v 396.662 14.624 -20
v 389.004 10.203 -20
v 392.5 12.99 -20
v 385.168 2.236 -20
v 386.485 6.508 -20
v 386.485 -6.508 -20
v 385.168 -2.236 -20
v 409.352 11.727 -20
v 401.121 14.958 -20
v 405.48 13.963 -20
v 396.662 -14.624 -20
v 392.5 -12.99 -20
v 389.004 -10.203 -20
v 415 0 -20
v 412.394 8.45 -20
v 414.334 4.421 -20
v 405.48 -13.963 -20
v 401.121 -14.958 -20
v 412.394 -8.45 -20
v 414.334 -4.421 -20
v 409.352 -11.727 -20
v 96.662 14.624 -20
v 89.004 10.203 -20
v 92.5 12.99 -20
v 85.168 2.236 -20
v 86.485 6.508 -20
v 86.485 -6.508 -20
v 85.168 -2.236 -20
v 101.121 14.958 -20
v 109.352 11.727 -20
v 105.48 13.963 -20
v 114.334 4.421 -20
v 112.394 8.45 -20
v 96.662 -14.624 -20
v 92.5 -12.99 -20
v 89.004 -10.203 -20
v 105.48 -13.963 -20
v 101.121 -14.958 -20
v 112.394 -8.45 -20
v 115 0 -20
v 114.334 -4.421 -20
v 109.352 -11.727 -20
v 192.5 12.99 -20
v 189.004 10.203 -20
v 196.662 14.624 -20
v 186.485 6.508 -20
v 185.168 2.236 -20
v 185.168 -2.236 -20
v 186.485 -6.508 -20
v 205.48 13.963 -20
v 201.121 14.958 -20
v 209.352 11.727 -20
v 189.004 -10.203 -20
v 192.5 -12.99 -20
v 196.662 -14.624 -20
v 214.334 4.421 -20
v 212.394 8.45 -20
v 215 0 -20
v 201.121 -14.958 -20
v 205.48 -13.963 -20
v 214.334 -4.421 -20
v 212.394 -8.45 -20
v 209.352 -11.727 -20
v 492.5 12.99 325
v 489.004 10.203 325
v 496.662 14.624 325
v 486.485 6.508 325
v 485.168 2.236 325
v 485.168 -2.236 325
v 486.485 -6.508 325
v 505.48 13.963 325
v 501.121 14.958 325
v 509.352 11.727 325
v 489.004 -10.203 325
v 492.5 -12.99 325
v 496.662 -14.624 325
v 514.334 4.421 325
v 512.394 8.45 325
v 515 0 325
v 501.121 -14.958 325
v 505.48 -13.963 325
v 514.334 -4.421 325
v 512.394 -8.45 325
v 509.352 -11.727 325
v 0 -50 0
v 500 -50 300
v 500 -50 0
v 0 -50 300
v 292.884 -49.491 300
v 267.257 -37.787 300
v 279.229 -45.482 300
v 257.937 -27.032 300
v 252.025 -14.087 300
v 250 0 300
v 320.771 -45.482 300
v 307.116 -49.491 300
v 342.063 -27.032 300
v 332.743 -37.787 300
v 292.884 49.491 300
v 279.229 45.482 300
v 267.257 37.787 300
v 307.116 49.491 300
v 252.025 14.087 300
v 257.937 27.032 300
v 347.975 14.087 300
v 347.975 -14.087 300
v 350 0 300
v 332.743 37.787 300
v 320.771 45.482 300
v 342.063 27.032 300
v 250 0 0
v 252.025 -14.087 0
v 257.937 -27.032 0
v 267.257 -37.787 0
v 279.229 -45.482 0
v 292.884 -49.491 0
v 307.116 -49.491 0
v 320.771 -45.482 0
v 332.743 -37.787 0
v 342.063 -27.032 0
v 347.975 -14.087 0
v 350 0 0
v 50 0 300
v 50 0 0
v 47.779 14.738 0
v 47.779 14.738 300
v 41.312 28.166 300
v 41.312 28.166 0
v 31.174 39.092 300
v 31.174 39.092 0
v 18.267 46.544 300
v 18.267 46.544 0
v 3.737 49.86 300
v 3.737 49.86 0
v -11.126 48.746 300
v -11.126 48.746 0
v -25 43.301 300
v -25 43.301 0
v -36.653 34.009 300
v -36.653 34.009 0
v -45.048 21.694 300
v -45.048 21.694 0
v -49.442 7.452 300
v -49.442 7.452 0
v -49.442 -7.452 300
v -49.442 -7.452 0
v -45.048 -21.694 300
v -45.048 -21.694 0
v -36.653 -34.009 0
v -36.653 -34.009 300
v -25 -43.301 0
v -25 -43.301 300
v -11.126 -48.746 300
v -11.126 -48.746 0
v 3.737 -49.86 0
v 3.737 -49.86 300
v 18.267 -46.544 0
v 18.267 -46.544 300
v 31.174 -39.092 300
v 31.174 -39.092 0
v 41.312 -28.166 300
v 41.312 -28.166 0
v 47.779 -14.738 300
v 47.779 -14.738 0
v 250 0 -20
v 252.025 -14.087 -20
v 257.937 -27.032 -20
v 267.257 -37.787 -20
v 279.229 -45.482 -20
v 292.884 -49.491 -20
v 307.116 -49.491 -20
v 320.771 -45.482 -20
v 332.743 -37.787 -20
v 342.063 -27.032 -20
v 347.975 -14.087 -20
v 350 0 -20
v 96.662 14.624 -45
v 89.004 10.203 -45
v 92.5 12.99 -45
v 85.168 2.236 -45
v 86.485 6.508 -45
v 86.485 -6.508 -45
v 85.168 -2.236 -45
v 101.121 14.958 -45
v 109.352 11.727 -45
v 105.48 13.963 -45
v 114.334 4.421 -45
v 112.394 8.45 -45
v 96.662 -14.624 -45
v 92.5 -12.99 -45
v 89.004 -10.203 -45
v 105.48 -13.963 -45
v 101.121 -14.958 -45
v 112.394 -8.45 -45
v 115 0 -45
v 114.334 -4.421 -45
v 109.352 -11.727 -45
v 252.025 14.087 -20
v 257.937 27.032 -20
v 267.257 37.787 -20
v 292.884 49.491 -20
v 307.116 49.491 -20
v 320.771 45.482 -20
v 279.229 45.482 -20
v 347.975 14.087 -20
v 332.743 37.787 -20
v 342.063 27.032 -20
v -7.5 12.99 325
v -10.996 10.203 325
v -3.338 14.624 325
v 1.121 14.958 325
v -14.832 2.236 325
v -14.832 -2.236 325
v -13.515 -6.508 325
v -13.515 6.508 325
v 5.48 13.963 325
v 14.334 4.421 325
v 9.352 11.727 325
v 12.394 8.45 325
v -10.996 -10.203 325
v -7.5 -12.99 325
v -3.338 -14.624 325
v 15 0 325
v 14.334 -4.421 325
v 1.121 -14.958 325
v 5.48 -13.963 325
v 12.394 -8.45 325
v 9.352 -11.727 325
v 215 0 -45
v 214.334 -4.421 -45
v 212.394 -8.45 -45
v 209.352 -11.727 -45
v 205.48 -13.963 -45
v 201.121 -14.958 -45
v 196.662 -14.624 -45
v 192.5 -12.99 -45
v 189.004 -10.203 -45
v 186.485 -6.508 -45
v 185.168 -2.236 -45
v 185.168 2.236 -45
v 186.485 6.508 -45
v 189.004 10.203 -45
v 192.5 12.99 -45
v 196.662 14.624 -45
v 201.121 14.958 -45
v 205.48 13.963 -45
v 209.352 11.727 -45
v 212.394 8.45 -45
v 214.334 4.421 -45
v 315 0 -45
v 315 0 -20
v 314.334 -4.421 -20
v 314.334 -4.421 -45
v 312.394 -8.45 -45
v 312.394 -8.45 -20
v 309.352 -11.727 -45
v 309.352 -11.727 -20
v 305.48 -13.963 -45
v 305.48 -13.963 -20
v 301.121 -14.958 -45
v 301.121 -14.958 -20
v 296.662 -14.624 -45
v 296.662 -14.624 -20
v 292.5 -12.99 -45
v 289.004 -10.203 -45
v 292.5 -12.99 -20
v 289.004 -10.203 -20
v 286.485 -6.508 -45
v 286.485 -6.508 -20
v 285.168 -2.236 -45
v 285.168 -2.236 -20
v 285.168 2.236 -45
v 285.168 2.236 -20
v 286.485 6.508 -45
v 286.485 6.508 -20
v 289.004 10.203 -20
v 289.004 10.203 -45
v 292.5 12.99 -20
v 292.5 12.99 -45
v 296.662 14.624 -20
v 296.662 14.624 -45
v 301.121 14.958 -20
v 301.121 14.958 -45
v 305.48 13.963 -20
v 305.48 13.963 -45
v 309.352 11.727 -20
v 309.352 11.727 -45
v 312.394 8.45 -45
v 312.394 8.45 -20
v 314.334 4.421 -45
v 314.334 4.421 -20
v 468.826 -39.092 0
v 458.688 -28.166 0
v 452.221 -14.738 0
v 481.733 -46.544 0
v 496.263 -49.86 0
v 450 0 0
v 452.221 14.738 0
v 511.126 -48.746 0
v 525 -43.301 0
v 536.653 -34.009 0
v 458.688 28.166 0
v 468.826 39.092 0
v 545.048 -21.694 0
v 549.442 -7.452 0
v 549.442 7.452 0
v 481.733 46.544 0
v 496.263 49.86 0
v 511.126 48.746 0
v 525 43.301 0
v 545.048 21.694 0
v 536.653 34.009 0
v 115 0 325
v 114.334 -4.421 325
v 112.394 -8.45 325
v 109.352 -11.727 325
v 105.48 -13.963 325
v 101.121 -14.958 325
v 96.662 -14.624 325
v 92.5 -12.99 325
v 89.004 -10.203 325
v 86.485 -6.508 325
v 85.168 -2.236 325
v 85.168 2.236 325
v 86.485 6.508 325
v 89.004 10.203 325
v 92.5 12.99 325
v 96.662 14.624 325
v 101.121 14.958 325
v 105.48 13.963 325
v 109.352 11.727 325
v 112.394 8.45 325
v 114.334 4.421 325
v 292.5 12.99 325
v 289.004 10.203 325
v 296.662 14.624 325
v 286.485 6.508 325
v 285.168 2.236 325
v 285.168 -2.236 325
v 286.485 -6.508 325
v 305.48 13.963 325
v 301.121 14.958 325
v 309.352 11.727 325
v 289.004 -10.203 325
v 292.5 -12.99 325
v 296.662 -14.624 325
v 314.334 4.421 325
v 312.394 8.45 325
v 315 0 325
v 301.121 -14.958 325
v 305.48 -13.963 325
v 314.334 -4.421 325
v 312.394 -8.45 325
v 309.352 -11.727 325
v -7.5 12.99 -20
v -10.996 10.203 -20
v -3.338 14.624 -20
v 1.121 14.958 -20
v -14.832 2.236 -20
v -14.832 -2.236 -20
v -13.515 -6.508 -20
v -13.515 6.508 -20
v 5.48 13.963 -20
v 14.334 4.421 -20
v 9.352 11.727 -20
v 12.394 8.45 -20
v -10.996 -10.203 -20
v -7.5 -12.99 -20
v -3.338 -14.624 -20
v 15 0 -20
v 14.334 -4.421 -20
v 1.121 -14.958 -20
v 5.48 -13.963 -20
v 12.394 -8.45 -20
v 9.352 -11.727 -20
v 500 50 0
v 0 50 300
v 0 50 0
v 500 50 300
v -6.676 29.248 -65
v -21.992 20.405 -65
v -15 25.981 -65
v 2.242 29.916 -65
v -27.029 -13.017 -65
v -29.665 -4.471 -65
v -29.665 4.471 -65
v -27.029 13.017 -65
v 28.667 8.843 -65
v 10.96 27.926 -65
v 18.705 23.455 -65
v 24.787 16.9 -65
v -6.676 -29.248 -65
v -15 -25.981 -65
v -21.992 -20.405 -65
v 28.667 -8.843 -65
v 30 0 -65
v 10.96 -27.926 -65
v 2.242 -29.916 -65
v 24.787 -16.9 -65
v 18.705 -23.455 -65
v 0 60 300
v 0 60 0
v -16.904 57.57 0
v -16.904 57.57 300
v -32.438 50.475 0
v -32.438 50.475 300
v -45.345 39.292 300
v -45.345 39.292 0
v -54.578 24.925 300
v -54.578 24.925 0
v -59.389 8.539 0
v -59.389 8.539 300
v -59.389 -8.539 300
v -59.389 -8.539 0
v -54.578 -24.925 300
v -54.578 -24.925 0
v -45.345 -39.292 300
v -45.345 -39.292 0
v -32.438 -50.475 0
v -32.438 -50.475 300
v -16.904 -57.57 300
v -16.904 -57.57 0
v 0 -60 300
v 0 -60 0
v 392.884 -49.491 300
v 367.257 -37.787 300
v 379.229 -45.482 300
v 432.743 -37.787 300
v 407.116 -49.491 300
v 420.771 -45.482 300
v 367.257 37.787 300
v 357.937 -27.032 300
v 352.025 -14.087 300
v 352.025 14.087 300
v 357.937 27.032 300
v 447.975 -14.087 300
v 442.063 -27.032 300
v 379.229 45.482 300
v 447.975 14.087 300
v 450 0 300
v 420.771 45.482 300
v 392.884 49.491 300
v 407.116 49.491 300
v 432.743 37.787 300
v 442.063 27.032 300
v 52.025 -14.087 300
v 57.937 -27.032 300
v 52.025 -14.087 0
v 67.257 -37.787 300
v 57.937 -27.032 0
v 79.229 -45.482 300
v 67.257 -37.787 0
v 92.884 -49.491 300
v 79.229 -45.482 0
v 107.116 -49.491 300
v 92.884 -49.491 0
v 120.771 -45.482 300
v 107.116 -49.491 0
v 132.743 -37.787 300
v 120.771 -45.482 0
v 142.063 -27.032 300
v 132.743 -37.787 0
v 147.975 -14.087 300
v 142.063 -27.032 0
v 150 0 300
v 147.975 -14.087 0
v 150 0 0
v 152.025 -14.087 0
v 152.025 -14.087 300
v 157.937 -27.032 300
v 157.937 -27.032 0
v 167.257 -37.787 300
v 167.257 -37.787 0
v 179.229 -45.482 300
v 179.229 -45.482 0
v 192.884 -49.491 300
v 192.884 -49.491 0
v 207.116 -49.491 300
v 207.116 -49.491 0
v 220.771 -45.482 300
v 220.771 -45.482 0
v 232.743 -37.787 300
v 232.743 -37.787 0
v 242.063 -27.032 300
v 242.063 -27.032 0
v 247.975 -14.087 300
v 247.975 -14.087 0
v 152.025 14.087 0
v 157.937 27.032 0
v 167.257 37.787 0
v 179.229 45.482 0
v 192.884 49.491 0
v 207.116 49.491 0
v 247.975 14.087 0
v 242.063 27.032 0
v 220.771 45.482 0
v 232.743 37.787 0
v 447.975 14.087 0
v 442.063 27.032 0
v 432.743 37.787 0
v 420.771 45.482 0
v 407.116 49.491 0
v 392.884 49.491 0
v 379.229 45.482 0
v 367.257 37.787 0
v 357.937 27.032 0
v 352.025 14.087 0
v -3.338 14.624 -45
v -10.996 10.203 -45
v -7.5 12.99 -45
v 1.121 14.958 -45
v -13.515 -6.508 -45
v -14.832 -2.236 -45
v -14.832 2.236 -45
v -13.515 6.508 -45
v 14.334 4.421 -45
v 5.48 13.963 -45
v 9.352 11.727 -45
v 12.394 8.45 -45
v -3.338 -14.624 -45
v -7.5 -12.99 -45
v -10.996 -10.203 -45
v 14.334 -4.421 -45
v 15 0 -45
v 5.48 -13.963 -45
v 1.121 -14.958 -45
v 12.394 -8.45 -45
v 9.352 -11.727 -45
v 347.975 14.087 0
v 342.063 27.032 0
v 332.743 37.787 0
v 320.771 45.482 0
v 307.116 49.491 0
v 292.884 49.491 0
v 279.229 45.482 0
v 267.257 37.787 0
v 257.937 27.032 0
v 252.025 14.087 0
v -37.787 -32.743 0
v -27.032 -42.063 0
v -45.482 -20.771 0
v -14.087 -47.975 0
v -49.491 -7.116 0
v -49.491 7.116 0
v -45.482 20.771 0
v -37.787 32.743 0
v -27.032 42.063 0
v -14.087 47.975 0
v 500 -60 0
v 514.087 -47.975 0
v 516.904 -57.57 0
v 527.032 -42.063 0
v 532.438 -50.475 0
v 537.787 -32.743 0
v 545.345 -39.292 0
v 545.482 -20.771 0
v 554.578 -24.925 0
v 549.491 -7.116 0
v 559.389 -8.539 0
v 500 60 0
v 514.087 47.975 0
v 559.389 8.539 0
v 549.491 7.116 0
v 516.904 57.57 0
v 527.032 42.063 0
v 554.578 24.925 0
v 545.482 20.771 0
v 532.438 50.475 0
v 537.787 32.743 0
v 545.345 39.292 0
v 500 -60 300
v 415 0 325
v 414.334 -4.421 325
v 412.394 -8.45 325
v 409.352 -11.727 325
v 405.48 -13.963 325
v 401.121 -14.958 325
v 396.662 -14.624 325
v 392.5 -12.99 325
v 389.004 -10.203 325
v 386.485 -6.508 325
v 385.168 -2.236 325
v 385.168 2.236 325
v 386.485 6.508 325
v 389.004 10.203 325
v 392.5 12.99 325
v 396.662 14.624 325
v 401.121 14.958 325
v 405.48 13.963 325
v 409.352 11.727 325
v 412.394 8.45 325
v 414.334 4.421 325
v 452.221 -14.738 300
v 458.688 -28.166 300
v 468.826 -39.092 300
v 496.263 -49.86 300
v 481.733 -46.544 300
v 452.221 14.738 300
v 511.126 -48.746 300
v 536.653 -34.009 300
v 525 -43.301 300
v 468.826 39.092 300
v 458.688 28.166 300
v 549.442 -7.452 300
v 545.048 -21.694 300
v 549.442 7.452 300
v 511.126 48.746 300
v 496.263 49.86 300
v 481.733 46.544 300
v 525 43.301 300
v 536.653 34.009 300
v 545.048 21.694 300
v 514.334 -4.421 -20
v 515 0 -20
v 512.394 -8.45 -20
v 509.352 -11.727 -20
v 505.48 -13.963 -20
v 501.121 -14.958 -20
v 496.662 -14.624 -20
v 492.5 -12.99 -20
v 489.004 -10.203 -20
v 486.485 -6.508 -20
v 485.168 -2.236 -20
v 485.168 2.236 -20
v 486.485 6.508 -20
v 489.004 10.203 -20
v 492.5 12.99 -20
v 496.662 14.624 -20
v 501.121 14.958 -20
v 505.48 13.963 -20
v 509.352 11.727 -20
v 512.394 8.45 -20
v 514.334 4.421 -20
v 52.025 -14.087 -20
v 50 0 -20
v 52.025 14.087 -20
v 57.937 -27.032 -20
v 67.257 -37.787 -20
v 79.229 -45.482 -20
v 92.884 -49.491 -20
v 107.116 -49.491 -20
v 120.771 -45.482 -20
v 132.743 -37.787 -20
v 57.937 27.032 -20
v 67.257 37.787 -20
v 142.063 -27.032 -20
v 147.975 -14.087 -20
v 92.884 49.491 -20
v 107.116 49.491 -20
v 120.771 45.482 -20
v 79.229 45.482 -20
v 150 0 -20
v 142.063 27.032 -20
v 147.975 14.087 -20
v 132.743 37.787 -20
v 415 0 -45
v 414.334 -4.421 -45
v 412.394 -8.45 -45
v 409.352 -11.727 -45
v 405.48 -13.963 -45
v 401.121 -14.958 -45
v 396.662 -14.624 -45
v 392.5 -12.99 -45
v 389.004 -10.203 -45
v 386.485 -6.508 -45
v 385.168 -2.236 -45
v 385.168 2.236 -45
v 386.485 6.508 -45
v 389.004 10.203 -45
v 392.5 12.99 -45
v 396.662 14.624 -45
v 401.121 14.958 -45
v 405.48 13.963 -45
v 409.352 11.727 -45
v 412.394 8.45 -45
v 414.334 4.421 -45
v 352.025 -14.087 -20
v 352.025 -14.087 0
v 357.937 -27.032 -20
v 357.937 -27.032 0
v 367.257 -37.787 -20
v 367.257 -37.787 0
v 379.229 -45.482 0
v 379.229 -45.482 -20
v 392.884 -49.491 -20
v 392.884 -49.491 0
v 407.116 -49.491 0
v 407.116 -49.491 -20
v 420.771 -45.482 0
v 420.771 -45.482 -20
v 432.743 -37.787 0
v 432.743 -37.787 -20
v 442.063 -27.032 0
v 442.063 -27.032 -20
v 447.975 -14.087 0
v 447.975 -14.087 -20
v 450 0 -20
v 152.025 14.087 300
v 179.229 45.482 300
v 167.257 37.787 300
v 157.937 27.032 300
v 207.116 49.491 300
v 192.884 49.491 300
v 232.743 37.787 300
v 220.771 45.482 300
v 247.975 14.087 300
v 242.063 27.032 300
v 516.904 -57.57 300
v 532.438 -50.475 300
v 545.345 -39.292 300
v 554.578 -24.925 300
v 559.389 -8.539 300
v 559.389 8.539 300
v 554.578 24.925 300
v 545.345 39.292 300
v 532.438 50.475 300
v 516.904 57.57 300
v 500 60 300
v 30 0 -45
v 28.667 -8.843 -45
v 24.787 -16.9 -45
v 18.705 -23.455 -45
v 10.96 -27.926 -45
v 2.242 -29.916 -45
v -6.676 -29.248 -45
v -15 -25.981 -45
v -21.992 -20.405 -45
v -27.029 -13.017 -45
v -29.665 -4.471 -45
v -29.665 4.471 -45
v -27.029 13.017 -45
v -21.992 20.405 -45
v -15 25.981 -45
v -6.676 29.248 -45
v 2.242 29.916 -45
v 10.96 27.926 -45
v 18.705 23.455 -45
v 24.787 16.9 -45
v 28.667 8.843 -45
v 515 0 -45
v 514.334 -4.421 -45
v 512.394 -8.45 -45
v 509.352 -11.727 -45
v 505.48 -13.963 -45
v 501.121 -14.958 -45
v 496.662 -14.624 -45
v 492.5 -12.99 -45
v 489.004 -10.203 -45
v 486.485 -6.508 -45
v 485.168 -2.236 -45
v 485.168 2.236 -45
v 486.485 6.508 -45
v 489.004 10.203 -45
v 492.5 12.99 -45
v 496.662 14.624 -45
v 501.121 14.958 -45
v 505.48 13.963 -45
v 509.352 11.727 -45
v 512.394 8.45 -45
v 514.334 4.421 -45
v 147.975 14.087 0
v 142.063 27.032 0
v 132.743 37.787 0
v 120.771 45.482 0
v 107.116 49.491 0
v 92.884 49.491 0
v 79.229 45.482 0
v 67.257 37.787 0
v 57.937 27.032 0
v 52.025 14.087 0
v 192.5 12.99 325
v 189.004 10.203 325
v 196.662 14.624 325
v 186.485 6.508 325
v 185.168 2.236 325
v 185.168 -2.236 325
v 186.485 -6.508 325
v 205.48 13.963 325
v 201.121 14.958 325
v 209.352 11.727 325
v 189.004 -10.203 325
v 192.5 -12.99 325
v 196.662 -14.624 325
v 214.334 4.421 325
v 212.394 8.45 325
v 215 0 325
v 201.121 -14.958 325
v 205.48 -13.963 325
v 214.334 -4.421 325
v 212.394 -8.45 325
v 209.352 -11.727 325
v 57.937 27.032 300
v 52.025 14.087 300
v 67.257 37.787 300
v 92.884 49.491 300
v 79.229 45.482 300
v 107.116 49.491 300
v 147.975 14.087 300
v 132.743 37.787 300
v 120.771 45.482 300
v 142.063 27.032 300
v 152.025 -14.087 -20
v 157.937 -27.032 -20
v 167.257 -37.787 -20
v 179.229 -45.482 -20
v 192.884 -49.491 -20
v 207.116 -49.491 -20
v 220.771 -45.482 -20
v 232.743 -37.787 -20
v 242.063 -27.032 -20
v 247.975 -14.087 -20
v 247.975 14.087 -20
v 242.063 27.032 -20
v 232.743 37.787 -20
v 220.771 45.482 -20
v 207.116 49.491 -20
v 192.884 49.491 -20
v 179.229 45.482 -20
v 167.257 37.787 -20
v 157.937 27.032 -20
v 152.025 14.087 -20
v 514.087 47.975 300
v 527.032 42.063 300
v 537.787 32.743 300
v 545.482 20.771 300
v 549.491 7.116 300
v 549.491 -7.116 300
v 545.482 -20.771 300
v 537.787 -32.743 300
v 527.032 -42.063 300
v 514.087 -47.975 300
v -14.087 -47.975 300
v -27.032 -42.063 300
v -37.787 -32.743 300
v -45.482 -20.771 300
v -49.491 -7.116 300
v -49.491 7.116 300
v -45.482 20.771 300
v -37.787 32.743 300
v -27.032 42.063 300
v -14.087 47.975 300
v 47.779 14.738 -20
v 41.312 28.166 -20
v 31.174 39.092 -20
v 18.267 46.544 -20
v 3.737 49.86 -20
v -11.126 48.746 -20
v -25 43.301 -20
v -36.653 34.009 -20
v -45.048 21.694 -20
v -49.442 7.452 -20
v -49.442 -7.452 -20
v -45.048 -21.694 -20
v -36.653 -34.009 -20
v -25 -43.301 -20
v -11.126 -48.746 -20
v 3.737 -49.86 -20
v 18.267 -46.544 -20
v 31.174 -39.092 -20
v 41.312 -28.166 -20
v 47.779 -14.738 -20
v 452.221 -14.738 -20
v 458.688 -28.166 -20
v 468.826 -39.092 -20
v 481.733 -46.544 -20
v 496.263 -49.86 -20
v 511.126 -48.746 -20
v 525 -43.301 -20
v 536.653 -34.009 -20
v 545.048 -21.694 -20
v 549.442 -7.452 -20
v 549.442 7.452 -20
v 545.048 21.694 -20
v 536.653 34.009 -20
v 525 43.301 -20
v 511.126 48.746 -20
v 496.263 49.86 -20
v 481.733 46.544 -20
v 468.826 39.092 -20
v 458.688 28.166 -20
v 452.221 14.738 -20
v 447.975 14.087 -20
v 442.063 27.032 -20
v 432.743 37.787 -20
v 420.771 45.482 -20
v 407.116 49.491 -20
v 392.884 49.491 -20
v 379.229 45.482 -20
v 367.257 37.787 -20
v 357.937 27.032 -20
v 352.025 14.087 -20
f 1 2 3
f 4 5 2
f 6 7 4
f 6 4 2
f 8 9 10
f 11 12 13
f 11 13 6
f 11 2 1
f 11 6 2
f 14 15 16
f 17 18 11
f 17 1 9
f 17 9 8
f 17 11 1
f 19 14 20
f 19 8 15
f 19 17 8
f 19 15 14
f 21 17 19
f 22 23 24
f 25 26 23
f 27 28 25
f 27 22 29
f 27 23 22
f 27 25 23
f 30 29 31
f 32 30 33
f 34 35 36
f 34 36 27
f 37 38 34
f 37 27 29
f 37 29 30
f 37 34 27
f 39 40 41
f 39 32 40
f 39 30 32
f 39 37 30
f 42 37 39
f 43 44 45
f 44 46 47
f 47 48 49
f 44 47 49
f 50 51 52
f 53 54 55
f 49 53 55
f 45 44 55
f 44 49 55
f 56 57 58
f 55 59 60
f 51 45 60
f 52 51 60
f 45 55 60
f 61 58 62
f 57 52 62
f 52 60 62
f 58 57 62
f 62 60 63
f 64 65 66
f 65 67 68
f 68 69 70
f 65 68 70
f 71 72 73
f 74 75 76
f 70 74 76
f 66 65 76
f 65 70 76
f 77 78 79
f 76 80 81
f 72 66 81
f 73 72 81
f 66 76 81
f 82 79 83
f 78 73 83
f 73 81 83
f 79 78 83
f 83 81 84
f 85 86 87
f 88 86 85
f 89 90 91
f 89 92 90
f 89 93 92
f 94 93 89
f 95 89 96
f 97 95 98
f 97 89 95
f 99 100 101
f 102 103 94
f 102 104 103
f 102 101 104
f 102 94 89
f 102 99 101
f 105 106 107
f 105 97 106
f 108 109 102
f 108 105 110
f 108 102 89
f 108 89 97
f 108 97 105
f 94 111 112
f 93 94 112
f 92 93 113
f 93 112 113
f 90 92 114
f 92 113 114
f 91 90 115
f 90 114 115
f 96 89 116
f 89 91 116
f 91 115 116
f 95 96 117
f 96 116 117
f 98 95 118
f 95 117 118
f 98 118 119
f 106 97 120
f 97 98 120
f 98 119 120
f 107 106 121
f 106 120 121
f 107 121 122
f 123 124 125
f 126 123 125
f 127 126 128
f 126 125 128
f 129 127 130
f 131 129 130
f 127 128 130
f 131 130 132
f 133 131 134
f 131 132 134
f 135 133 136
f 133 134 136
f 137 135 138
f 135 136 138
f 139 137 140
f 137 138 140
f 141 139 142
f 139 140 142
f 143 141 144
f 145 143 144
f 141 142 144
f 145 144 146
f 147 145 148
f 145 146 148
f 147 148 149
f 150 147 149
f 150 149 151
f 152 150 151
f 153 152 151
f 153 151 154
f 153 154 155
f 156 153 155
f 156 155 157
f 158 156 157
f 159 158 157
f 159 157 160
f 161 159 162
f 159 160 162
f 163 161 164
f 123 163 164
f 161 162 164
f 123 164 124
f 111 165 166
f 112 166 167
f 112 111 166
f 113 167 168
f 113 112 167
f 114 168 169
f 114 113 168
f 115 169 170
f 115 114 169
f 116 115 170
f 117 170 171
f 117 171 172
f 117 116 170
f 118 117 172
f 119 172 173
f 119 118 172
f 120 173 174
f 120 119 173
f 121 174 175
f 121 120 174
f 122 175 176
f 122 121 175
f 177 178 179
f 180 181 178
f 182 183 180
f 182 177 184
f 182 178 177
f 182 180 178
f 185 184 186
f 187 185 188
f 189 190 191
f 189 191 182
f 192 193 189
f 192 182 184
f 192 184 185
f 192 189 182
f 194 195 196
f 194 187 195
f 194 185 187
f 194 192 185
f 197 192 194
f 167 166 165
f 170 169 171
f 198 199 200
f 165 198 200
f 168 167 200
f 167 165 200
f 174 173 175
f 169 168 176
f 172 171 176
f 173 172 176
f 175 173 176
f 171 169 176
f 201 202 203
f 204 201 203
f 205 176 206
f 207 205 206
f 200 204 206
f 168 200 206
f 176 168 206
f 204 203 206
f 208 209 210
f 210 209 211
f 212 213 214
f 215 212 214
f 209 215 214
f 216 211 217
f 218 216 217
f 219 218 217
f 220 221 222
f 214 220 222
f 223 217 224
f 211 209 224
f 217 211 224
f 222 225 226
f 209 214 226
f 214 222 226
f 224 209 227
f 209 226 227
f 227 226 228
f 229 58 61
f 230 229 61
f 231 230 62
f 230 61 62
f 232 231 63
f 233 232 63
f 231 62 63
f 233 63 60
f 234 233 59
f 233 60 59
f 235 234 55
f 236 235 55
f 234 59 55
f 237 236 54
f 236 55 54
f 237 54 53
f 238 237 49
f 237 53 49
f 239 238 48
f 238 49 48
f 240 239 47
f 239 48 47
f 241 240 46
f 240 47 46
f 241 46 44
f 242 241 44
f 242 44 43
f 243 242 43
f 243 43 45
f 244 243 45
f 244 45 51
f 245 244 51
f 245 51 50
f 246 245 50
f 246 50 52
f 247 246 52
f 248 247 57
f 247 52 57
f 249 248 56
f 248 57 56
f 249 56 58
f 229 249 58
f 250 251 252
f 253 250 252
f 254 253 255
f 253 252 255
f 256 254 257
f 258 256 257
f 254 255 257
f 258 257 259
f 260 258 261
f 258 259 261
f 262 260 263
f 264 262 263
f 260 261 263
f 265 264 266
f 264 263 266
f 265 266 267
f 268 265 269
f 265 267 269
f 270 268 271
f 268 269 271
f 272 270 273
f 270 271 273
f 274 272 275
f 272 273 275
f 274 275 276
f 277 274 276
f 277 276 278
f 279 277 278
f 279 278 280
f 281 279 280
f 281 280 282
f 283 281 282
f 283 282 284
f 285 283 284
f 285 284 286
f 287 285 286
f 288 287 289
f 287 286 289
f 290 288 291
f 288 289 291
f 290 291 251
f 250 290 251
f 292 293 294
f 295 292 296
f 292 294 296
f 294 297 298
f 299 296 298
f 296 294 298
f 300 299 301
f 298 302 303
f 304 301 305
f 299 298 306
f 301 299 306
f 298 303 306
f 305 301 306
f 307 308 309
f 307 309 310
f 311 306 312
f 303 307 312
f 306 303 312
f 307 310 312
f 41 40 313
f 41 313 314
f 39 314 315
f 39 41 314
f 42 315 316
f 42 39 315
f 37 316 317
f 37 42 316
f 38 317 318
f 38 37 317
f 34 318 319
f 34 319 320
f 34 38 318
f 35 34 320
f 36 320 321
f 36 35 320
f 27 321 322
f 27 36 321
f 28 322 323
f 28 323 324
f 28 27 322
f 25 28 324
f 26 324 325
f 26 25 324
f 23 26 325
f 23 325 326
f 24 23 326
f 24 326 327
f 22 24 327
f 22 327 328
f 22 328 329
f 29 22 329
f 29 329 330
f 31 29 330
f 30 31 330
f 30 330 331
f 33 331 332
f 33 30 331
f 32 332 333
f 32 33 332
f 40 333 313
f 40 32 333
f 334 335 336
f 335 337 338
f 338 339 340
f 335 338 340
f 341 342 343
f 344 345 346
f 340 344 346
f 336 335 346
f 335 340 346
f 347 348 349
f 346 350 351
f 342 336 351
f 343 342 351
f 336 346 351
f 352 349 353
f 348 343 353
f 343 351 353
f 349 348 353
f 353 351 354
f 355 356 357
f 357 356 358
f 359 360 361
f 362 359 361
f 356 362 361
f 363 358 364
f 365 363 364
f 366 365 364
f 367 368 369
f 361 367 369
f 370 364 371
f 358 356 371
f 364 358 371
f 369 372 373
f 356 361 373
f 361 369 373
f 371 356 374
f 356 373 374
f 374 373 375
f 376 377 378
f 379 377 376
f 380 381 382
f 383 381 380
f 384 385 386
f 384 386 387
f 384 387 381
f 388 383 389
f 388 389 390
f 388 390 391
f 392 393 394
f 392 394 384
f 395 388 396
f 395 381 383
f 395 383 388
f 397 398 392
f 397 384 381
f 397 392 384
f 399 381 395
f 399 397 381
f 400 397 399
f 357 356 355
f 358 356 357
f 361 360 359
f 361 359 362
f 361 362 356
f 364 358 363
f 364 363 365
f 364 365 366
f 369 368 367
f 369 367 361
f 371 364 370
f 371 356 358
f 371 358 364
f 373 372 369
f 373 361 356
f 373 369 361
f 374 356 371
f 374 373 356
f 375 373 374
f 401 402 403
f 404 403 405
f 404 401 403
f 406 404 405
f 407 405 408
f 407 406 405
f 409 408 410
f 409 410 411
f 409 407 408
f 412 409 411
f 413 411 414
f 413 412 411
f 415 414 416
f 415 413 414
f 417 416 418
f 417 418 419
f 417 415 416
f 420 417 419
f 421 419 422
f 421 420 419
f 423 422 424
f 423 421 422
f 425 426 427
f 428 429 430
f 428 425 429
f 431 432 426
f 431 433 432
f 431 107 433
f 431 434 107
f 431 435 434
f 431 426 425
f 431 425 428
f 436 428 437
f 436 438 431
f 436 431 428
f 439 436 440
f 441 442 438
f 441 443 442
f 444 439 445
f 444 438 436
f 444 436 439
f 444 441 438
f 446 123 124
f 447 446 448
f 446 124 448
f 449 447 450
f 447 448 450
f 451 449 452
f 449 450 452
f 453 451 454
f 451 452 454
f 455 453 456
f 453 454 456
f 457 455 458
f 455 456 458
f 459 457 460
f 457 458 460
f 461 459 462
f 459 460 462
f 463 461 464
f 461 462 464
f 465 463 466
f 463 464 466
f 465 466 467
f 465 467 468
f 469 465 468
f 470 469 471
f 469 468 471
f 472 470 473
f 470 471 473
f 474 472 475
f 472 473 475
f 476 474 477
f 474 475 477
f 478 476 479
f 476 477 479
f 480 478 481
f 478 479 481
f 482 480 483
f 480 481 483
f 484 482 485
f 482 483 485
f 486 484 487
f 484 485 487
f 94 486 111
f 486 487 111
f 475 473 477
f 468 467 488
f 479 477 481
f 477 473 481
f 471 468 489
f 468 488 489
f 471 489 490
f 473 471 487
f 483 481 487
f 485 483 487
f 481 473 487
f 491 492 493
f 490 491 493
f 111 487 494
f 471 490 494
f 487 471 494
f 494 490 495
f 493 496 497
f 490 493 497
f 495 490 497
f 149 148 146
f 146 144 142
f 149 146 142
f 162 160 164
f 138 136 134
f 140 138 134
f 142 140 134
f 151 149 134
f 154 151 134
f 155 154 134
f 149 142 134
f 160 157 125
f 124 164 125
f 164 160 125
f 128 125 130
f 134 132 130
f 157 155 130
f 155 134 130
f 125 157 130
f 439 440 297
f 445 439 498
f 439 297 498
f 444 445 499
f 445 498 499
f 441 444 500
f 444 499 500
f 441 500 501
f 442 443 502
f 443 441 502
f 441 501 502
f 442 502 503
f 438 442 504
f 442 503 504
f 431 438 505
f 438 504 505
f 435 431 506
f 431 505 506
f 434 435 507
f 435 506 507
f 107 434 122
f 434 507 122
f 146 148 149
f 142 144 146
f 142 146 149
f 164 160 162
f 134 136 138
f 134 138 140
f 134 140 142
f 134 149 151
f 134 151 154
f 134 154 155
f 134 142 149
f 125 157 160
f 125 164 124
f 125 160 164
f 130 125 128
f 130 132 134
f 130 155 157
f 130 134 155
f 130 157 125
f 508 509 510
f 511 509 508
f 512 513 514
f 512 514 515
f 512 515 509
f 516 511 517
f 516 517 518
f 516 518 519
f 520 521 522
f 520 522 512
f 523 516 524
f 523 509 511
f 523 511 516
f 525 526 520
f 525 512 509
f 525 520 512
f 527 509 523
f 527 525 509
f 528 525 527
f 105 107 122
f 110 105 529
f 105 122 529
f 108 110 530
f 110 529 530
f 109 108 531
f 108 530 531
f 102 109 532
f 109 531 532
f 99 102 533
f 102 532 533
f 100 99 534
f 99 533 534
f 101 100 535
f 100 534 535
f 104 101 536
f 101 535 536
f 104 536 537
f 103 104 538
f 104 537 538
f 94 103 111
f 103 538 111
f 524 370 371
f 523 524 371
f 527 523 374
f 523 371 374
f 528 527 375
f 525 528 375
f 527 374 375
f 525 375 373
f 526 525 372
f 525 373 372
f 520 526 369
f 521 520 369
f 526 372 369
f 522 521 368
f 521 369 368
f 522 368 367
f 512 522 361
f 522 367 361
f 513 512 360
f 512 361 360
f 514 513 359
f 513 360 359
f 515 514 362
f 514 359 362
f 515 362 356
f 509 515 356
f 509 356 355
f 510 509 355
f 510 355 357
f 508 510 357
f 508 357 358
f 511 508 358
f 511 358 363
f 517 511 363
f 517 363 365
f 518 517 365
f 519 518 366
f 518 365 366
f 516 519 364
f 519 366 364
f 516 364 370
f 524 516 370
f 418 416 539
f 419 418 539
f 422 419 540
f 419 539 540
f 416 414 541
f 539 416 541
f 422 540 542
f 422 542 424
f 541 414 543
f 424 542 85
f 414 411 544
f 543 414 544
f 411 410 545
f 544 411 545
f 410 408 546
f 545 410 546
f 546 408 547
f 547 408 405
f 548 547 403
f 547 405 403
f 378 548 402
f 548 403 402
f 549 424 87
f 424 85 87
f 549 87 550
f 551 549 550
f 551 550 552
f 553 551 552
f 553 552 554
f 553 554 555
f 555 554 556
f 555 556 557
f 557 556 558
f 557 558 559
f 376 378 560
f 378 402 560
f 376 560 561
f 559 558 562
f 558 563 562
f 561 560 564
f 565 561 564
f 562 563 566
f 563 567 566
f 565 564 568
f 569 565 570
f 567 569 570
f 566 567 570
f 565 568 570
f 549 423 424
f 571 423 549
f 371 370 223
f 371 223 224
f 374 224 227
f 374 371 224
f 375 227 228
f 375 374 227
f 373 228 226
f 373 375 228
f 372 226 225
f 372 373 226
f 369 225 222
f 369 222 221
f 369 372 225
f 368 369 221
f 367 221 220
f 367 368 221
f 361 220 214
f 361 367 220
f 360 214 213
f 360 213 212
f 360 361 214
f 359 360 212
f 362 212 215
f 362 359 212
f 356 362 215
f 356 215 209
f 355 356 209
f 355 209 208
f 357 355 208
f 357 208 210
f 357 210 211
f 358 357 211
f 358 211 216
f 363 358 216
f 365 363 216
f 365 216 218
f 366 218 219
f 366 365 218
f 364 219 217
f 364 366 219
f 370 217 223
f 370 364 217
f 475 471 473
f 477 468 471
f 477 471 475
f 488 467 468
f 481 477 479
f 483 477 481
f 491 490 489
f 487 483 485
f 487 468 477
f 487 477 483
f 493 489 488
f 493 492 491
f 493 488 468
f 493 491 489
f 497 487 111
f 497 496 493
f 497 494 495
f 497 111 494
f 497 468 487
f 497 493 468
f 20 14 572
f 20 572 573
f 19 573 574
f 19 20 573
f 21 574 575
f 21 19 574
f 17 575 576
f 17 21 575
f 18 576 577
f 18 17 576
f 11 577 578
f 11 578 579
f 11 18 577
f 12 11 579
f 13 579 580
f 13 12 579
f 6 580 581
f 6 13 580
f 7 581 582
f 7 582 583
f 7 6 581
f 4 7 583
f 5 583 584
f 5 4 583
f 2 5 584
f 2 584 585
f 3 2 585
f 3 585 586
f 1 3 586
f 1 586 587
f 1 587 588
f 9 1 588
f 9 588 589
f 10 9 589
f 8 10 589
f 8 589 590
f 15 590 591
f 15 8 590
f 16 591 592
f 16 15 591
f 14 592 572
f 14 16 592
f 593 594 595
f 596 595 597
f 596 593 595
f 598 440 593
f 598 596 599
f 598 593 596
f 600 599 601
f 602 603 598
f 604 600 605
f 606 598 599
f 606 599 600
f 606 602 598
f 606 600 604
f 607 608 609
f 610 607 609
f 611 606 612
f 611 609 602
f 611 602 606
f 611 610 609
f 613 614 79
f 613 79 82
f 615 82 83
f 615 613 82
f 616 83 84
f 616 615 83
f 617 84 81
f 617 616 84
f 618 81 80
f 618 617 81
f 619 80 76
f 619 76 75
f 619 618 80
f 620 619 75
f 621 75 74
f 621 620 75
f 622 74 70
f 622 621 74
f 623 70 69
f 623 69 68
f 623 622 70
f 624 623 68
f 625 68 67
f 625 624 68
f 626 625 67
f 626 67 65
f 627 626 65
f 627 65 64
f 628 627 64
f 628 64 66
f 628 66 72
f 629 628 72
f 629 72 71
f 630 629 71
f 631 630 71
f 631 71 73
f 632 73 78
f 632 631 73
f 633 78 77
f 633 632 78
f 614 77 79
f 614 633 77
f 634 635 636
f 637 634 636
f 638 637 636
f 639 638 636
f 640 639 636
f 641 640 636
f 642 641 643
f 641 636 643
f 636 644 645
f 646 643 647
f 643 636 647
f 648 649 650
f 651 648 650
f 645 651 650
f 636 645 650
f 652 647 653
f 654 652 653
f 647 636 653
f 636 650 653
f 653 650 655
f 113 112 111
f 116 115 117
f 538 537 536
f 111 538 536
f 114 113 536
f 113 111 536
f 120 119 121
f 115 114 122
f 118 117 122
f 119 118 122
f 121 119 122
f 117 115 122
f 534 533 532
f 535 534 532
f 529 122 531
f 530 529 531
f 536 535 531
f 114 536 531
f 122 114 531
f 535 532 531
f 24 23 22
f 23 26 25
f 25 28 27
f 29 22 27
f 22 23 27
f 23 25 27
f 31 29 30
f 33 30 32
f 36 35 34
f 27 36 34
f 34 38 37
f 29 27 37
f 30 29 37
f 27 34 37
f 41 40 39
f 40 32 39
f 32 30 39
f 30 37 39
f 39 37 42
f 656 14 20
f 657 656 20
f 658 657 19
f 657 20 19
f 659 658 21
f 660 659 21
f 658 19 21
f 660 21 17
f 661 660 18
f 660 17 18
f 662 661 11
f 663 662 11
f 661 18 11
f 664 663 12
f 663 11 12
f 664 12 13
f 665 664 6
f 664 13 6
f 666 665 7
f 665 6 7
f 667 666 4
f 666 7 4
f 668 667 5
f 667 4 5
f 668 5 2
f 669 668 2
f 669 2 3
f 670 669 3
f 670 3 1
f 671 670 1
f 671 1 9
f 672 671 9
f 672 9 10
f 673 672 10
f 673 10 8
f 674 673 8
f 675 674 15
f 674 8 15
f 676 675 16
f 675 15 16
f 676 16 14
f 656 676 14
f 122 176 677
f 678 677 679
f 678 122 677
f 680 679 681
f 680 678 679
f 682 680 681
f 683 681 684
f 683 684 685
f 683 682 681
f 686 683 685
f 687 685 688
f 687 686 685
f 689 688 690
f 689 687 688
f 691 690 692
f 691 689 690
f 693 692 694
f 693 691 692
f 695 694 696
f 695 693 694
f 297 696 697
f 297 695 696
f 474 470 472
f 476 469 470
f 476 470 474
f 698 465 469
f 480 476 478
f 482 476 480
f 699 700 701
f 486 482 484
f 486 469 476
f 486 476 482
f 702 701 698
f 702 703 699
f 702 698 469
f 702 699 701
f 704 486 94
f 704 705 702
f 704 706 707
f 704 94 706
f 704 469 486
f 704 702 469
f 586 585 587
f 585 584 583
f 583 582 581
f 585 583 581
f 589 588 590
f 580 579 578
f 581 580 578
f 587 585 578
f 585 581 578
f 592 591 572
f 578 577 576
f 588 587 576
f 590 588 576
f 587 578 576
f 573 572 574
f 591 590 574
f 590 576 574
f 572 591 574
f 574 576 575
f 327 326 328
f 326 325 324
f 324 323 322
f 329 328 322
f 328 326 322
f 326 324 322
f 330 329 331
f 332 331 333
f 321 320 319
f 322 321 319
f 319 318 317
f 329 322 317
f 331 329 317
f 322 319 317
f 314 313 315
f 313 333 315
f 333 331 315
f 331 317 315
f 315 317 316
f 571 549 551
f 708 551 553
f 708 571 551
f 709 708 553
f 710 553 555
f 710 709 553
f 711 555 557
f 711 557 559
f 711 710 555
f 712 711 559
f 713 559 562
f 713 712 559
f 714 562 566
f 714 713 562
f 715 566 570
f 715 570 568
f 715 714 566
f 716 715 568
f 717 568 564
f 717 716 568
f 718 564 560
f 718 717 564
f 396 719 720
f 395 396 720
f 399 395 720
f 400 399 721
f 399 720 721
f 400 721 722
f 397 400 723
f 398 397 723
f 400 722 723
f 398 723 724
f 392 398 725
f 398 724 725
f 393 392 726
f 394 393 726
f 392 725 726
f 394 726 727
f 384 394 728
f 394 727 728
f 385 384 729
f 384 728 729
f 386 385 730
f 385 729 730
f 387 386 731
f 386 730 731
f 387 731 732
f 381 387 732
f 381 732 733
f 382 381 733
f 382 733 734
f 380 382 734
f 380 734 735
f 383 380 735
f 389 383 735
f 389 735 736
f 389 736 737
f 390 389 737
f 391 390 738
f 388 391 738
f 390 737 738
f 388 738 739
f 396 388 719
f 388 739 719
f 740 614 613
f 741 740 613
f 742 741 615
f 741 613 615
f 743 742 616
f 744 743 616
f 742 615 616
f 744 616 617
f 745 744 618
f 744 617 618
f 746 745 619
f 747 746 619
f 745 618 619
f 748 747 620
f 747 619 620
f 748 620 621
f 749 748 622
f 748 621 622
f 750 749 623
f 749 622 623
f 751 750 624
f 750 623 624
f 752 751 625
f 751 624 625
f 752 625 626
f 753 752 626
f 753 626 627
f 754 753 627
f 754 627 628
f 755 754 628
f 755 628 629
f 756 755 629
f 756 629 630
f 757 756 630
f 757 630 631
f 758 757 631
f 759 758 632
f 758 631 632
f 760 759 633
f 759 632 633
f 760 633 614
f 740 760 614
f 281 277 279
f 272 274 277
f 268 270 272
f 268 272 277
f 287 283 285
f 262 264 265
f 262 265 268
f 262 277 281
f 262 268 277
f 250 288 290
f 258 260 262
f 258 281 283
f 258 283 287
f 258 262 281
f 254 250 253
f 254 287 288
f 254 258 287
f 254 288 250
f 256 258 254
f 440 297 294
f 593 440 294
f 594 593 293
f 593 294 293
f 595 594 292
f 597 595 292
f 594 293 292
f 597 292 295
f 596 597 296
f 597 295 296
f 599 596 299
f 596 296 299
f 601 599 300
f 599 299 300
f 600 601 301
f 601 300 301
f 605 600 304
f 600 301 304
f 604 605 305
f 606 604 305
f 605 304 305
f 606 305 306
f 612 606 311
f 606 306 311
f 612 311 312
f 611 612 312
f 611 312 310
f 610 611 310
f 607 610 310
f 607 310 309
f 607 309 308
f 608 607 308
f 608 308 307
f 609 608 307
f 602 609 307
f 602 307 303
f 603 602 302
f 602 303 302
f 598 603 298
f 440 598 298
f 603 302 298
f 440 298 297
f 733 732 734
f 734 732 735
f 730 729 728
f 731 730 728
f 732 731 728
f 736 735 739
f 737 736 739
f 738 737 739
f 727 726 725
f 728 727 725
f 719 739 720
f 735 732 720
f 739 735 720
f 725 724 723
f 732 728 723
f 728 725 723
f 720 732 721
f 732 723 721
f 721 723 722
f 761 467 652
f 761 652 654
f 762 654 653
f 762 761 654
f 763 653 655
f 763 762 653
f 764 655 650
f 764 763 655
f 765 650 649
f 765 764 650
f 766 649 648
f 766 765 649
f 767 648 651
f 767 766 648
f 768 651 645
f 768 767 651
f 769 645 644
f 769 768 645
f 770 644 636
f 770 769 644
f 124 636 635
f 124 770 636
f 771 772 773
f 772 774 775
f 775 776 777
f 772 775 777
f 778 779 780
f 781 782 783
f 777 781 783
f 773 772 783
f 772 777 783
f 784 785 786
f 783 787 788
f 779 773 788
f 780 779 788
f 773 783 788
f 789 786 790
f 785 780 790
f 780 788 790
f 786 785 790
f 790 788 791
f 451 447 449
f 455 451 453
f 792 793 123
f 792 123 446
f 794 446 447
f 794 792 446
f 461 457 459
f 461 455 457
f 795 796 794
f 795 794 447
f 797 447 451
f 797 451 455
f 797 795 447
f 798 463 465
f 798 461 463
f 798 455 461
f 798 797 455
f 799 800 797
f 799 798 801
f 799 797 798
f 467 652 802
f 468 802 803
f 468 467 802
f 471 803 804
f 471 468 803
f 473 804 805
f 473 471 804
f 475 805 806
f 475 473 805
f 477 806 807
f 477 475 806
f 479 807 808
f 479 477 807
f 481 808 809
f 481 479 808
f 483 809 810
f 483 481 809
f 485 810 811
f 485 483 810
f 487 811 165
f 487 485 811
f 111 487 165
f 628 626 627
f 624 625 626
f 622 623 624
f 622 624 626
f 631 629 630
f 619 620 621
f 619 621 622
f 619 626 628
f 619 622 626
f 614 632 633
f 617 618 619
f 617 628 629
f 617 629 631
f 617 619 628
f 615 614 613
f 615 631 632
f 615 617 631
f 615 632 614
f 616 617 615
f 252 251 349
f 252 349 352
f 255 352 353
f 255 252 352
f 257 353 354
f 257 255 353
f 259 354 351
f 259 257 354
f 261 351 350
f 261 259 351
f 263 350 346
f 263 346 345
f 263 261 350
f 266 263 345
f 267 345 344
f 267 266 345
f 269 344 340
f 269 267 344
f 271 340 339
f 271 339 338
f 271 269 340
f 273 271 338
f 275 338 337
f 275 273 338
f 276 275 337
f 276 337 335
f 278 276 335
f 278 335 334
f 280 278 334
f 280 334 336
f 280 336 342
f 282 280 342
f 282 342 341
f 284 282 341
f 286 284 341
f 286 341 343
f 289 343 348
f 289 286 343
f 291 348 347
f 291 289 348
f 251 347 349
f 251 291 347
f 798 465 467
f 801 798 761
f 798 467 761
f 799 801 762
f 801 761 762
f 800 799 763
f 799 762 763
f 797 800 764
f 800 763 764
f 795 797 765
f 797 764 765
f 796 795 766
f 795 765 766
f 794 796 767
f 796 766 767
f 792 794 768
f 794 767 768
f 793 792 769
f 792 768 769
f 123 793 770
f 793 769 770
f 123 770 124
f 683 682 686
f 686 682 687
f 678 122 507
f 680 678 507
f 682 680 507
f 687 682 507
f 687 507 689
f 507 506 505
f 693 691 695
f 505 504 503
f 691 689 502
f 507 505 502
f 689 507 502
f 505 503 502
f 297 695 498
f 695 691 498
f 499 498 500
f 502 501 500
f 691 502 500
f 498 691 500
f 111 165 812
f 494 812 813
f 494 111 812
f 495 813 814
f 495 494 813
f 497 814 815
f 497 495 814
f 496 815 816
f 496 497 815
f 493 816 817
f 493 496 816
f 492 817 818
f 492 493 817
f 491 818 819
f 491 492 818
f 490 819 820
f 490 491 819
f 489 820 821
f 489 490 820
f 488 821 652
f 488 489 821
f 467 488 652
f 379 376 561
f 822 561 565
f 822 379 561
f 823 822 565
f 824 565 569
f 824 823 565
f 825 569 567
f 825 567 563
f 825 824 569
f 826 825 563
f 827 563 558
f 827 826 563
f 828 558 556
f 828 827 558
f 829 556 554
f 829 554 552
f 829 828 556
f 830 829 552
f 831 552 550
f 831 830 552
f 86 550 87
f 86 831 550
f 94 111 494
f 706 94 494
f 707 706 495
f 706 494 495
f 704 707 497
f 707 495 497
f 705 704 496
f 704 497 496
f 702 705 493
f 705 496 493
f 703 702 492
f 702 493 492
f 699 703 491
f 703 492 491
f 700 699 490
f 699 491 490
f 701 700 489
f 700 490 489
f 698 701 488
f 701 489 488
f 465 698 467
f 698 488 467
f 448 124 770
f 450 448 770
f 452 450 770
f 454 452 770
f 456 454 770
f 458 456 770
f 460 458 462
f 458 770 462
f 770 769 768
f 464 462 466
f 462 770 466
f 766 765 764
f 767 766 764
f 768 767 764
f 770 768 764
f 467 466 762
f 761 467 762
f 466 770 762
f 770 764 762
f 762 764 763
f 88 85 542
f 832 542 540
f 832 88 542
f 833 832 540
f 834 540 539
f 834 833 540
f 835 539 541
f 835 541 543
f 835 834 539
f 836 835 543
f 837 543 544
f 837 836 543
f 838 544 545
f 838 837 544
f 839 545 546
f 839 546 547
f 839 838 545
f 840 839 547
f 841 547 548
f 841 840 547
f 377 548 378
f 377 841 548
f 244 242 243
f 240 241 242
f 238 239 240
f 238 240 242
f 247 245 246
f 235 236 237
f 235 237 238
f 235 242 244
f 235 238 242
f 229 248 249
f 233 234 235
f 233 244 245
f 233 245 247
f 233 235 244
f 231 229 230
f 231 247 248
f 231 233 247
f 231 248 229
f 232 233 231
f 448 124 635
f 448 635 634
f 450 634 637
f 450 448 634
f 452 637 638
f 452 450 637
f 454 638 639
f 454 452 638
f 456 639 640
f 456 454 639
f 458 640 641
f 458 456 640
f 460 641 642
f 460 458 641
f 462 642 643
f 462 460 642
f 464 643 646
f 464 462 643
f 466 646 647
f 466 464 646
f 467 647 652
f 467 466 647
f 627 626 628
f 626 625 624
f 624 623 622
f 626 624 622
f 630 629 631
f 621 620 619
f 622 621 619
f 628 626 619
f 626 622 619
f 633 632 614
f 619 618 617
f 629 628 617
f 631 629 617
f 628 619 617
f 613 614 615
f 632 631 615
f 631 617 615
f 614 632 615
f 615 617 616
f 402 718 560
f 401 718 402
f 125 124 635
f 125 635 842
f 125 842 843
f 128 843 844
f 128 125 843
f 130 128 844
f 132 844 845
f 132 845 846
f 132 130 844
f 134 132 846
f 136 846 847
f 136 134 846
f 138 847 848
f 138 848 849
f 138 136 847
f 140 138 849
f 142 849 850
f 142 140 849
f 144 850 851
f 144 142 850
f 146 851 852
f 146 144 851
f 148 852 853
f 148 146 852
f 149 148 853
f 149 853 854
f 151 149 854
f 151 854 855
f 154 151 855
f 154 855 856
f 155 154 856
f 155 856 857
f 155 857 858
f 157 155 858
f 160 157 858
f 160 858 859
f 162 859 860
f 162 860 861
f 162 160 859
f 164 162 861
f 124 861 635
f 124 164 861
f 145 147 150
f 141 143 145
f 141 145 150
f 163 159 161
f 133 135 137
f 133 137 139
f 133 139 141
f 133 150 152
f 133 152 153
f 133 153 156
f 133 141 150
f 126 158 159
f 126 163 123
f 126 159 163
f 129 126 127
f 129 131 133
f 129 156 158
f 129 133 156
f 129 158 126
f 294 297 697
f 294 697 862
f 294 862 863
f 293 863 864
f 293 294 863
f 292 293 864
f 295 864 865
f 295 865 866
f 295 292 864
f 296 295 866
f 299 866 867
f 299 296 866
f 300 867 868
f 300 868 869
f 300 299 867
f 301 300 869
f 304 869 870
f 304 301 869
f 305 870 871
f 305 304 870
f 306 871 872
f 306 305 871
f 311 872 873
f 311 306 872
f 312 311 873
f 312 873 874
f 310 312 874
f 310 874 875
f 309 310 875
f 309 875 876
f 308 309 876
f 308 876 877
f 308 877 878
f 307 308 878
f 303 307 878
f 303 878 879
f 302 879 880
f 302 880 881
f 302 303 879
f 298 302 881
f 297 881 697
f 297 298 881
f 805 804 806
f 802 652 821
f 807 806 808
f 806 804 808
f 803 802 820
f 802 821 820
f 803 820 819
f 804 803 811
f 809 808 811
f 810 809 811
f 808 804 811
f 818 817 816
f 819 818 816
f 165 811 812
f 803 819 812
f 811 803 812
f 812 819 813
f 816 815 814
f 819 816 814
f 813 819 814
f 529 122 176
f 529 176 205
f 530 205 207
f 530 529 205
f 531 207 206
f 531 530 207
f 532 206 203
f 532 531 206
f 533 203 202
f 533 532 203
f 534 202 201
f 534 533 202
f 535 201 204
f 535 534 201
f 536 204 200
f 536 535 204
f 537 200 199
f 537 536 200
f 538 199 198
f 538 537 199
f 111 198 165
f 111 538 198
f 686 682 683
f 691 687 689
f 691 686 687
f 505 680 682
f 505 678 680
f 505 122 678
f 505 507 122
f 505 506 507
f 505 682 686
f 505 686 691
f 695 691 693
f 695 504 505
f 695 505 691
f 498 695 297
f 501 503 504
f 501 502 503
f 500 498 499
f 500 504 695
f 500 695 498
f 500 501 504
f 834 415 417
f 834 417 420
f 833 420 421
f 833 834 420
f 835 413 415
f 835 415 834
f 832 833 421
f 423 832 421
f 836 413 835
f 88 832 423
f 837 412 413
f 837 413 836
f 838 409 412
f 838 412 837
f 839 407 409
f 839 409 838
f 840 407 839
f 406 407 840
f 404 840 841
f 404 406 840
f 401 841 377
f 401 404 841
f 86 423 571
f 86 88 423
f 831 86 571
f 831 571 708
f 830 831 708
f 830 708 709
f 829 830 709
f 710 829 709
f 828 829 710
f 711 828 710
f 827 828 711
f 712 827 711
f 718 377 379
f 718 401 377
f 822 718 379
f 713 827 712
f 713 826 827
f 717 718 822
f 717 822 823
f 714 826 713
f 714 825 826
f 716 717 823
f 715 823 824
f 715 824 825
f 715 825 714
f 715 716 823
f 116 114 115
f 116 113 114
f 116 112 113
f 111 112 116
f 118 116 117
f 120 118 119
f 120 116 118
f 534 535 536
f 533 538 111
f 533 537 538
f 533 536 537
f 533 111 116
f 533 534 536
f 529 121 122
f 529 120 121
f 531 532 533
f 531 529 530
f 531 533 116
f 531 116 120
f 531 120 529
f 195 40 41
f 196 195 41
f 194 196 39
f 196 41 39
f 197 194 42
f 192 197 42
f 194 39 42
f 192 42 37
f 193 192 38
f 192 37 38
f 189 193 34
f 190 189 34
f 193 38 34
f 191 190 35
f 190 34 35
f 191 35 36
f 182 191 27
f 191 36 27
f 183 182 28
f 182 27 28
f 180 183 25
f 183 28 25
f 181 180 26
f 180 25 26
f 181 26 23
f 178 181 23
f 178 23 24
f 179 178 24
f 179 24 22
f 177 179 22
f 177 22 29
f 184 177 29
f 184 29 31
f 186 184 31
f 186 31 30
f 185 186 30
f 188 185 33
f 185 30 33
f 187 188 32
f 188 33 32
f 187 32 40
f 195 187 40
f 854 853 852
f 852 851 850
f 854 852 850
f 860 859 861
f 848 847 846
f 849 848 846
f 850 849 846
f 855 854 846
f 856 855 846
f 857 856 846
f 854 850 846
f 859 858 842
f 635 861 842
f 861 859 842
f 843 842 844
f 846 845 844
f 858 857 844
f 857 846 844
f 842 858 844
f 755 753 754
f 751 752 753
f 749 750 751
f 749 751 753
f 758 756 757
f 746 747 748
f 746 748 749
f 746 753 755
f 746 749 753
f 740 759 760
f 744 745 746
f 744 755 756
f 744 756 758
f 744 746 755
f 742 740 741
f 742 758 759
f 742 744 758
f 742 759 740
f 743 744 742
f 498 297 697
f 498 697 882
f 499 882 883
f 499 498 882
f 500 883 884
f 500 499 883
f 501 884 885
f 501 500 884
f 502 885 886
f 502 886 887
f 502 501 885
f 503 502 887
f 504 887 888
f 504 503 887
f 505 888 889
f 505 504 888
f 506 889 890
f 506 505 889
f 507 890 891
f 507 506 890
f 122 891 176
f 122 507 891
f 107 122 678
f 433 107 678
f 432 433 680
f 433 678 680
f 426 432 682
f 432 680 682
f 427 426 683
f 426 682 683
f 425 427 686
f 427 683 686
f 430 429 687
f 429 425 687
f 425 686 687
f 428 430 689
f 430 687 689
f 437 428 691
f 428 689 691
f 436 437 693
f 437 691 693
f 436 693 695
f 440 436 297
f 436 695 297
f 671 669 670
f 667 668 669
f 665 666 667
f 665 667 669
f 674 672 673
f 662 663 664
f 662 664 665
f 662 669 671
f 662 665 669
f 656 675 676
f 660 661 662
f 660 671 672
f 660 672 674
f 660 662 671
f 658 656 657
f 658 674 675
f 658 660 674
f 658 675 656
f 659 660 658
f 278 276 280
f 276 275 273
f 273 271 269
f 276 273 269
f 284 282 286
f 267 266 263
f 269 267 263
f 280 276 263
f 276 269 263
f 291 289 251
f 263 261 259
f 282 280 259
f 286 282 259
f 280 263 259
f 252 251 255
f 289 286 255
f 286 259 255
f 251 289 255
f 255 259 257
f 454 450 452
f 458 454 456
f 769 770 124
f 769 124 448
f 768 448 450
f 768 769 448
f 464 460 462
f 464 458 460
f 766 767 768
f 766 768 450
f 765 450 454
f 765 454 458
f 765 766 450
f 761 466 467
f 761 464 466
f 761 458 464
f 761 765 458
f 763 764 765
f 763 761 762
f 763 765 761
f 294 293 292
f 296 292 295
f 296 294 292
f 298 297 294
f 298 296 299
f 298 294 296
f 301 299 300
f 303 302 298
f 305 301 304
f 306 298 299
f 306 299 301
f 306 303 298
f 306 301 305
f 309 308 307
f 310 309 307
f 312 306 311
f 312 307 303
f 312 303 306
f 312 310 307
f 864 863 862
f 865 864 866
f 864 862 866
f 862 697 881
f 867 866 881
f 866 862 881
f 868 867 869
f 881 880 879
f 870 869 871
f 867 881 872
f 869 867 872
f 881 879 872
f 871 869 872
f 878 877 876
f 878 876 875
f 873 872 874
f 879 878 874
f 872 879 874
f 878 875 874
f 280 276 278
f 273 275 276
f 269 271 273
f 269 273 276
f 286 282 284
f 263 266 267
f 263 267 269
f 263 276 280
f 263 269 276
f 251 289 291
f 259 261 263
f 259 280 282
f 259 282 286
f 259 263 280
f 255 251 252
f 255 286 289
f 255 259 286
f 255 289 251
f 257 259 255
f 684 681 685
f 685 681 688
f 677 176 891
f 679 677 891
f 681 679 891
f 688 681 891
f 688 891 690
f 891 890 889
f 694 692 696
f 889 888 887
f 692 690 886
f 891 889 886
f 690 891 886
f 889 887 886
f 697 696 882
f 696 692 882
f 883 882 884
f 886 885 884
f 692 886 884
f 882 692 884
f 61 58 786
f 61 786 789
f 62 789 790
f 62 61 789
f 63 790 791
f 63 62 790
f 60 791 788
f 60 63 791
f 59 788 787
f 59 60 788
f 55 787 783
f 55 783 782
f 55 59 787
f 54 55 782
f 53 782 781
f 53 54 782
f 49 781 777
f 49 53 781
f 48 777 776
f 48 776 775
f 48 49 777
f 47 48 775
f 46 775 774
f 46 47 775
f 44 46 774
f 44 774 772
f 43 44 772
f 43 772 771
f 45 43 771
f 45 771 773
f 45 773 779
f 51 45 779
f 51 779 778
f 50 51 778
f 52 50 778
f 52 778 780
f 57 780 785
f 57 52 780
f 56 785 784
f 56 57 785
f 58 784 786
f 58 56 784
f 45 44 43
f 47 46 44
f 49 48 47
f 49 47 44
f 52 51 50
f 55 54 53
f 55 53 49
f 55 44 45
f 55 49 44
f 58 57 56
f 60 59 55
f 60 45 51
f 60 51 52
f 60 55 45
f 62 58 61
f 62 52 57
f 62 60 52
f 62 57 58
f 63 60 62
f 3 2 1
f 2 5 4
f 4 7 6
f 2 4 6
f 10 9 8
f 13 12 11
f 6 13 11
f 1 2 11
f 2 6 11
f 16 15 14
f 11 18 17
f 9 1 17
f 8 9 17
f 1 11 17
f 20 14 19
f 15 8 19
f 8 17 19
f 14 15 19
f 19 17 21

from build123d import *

# Parameters (mm, degrees)
F0_R     = 50
F1_DEPTH = 300
F2_DEPTH = 20
F3_R     = 15
F4_DEPTH = 25
F5_DEPTH = 345
F6_R     = 30
F7_DEPTH = 20
F9_DEPTH = 300


with BuildPart() as f1:
    # F0 (on Top) → F1 (new body)
    with BuildSketch(Plane.XY):
        Circle(F0_R)
        with BuildLine():
            ThreePointArc((550, 0), (500, 50), (450, 0))
            ThreePointArc((450, 0), (500, -50), (550, 0))
        make_face()
        with BuildLine():
            ThreePointArc((450, 0), (400, 50), (350, 0))
            ThreePointArc((350, 0), (400, -50), (450, 0))
        make_face()
        with BuildLine():
            ThreePointArc((350, 0), (300, 50), (250, 0))
            ThreePointArc((250, 0), (300, -50), (350, 0))
        make_face()
        with BuildLine():
            ThreePointArc((250, 0), (200, 50), (150, 0))
            ThreePointArc((150, 0), (200, -50), (250, 0))
        make_face()
        with BuildLine():
            ThreePointArc((150, 0), (100, 50), (50, 0))
            ThreePointArc((50, 0), (100, -50), (150, 0))
        make_face()
    extrude(amount=F1_DEPTH)


with BuildPart() as f2:
    # F0 (on Top) → F2 (new body)
    with BuildSketch(Plane.XY):
        Circle(F0_R)
        with BuildLine():
            ThreePointArc((550, 0), (500, 50), (450, 0))
            ThreePointArc((450, 0), (500, -50), (550, 0))
        make_face()
        with BuildLine():
            ThreePointArc((450, 0), (400, 50), (350, 0))
            ThreePointArc((350, 0), (400, -50), (450, 0))
        make_face()
        with BuildLine():
            ThreePointArc((350, 0), (300, 50), (250, 0))
            ThreePointArc((250, 0), (300, -50), (350, 0))
        make_face()
        with BuildLine():
            ThreePointArc((250, 0), (200, 50), (150, 0))
            ThreePointArc((150, 0), (200, -50), (250, 0))
        make_face()
        with BuildLine():
            ThreePointArc((150, 0), (100, 50), (50, 0))
            ThreePointArc((50, 0), (100, -50), (150, 0))
        make_face()
    extrude(amount=-F2_DEPTH)


with BuildPart() as f4:
    # F3 (on face) → F4 (new body)
    with BuildSketch(Plane(origin=(0, 0, -20), x_dir=(1, 0, 0), z_dir=(0, 0, -1))):
        Circle(F3_R)
        with Locations((100, 0)):
            Circle(F3_R)
        with Locations((200, 0)):
            Circle(F3_R)
        with Locations((300, 0)):
            Circle(F3_R)
        with Locations((400, 0)):
            Circle(F3_R)
        with Locations((500, 0)):
            Circle(F3_R)
    extrude(amount=F4_DEPTH)


with BuildPart() as f5:
    # F3 (on face) → F5 (new body)
    with BuildSketch(Plane(origin=(0, 0, -20), x_dir=(1, 0, 0), z_dir=(0, 0, -1))):
        Circle(F3_R)
        with Locations((100, 0)):
            Circle(F3_R)
        with Locations((200, 0)):
            Circle(F3_R)
        with Locations((300, 0)):
            Circle(F3_R)
        with Locations((400, 0)):
            Circle(F3_R)
        with Locations((500, 0)):
            Circle(F3_R)
    extrude(amount=-F5_DEPTH)


with BuildPart() as f7:
    # F6 (on face) → F7 (new body)
    with BuildSketch(Plane(origin=(0, 0, -45), x_dir=(1, 0, 0), z_dir=(0, 0, -1))):
        Circle(F6_R)
    extrude(amount=F7_DEPTH)


with BuildPart() as f9:
    # F8 (on face) → F9 (new body)
    with BuildSketch(Plane.XY.offset(300)):
        with BuildLine():
            Line((500, 60), (0, 60))
            ThreePointArc((0, 60), (-60, 0), (0, -60))
            Line((0, -60), (500, -60))
            ThreePointArc((500, -60), (560, 0), (500, 60))
        make_face()
        with BuildLine():
            ThreePointArc((0, -50), (-50, 0), (0, 50))
            Line((0, 50), (500, 50))
            ThreePointArc((500, 50), (550, 0), (500, -50))
            Line((500, -50), (0, -50))
        make_face(mode=Mode.SUBTRACT)
    extrude(amount=-F9_DEPTH)


solid = Compound([f1.part, f2.part, f4.part, f5.part, f7.part, f9.part])
